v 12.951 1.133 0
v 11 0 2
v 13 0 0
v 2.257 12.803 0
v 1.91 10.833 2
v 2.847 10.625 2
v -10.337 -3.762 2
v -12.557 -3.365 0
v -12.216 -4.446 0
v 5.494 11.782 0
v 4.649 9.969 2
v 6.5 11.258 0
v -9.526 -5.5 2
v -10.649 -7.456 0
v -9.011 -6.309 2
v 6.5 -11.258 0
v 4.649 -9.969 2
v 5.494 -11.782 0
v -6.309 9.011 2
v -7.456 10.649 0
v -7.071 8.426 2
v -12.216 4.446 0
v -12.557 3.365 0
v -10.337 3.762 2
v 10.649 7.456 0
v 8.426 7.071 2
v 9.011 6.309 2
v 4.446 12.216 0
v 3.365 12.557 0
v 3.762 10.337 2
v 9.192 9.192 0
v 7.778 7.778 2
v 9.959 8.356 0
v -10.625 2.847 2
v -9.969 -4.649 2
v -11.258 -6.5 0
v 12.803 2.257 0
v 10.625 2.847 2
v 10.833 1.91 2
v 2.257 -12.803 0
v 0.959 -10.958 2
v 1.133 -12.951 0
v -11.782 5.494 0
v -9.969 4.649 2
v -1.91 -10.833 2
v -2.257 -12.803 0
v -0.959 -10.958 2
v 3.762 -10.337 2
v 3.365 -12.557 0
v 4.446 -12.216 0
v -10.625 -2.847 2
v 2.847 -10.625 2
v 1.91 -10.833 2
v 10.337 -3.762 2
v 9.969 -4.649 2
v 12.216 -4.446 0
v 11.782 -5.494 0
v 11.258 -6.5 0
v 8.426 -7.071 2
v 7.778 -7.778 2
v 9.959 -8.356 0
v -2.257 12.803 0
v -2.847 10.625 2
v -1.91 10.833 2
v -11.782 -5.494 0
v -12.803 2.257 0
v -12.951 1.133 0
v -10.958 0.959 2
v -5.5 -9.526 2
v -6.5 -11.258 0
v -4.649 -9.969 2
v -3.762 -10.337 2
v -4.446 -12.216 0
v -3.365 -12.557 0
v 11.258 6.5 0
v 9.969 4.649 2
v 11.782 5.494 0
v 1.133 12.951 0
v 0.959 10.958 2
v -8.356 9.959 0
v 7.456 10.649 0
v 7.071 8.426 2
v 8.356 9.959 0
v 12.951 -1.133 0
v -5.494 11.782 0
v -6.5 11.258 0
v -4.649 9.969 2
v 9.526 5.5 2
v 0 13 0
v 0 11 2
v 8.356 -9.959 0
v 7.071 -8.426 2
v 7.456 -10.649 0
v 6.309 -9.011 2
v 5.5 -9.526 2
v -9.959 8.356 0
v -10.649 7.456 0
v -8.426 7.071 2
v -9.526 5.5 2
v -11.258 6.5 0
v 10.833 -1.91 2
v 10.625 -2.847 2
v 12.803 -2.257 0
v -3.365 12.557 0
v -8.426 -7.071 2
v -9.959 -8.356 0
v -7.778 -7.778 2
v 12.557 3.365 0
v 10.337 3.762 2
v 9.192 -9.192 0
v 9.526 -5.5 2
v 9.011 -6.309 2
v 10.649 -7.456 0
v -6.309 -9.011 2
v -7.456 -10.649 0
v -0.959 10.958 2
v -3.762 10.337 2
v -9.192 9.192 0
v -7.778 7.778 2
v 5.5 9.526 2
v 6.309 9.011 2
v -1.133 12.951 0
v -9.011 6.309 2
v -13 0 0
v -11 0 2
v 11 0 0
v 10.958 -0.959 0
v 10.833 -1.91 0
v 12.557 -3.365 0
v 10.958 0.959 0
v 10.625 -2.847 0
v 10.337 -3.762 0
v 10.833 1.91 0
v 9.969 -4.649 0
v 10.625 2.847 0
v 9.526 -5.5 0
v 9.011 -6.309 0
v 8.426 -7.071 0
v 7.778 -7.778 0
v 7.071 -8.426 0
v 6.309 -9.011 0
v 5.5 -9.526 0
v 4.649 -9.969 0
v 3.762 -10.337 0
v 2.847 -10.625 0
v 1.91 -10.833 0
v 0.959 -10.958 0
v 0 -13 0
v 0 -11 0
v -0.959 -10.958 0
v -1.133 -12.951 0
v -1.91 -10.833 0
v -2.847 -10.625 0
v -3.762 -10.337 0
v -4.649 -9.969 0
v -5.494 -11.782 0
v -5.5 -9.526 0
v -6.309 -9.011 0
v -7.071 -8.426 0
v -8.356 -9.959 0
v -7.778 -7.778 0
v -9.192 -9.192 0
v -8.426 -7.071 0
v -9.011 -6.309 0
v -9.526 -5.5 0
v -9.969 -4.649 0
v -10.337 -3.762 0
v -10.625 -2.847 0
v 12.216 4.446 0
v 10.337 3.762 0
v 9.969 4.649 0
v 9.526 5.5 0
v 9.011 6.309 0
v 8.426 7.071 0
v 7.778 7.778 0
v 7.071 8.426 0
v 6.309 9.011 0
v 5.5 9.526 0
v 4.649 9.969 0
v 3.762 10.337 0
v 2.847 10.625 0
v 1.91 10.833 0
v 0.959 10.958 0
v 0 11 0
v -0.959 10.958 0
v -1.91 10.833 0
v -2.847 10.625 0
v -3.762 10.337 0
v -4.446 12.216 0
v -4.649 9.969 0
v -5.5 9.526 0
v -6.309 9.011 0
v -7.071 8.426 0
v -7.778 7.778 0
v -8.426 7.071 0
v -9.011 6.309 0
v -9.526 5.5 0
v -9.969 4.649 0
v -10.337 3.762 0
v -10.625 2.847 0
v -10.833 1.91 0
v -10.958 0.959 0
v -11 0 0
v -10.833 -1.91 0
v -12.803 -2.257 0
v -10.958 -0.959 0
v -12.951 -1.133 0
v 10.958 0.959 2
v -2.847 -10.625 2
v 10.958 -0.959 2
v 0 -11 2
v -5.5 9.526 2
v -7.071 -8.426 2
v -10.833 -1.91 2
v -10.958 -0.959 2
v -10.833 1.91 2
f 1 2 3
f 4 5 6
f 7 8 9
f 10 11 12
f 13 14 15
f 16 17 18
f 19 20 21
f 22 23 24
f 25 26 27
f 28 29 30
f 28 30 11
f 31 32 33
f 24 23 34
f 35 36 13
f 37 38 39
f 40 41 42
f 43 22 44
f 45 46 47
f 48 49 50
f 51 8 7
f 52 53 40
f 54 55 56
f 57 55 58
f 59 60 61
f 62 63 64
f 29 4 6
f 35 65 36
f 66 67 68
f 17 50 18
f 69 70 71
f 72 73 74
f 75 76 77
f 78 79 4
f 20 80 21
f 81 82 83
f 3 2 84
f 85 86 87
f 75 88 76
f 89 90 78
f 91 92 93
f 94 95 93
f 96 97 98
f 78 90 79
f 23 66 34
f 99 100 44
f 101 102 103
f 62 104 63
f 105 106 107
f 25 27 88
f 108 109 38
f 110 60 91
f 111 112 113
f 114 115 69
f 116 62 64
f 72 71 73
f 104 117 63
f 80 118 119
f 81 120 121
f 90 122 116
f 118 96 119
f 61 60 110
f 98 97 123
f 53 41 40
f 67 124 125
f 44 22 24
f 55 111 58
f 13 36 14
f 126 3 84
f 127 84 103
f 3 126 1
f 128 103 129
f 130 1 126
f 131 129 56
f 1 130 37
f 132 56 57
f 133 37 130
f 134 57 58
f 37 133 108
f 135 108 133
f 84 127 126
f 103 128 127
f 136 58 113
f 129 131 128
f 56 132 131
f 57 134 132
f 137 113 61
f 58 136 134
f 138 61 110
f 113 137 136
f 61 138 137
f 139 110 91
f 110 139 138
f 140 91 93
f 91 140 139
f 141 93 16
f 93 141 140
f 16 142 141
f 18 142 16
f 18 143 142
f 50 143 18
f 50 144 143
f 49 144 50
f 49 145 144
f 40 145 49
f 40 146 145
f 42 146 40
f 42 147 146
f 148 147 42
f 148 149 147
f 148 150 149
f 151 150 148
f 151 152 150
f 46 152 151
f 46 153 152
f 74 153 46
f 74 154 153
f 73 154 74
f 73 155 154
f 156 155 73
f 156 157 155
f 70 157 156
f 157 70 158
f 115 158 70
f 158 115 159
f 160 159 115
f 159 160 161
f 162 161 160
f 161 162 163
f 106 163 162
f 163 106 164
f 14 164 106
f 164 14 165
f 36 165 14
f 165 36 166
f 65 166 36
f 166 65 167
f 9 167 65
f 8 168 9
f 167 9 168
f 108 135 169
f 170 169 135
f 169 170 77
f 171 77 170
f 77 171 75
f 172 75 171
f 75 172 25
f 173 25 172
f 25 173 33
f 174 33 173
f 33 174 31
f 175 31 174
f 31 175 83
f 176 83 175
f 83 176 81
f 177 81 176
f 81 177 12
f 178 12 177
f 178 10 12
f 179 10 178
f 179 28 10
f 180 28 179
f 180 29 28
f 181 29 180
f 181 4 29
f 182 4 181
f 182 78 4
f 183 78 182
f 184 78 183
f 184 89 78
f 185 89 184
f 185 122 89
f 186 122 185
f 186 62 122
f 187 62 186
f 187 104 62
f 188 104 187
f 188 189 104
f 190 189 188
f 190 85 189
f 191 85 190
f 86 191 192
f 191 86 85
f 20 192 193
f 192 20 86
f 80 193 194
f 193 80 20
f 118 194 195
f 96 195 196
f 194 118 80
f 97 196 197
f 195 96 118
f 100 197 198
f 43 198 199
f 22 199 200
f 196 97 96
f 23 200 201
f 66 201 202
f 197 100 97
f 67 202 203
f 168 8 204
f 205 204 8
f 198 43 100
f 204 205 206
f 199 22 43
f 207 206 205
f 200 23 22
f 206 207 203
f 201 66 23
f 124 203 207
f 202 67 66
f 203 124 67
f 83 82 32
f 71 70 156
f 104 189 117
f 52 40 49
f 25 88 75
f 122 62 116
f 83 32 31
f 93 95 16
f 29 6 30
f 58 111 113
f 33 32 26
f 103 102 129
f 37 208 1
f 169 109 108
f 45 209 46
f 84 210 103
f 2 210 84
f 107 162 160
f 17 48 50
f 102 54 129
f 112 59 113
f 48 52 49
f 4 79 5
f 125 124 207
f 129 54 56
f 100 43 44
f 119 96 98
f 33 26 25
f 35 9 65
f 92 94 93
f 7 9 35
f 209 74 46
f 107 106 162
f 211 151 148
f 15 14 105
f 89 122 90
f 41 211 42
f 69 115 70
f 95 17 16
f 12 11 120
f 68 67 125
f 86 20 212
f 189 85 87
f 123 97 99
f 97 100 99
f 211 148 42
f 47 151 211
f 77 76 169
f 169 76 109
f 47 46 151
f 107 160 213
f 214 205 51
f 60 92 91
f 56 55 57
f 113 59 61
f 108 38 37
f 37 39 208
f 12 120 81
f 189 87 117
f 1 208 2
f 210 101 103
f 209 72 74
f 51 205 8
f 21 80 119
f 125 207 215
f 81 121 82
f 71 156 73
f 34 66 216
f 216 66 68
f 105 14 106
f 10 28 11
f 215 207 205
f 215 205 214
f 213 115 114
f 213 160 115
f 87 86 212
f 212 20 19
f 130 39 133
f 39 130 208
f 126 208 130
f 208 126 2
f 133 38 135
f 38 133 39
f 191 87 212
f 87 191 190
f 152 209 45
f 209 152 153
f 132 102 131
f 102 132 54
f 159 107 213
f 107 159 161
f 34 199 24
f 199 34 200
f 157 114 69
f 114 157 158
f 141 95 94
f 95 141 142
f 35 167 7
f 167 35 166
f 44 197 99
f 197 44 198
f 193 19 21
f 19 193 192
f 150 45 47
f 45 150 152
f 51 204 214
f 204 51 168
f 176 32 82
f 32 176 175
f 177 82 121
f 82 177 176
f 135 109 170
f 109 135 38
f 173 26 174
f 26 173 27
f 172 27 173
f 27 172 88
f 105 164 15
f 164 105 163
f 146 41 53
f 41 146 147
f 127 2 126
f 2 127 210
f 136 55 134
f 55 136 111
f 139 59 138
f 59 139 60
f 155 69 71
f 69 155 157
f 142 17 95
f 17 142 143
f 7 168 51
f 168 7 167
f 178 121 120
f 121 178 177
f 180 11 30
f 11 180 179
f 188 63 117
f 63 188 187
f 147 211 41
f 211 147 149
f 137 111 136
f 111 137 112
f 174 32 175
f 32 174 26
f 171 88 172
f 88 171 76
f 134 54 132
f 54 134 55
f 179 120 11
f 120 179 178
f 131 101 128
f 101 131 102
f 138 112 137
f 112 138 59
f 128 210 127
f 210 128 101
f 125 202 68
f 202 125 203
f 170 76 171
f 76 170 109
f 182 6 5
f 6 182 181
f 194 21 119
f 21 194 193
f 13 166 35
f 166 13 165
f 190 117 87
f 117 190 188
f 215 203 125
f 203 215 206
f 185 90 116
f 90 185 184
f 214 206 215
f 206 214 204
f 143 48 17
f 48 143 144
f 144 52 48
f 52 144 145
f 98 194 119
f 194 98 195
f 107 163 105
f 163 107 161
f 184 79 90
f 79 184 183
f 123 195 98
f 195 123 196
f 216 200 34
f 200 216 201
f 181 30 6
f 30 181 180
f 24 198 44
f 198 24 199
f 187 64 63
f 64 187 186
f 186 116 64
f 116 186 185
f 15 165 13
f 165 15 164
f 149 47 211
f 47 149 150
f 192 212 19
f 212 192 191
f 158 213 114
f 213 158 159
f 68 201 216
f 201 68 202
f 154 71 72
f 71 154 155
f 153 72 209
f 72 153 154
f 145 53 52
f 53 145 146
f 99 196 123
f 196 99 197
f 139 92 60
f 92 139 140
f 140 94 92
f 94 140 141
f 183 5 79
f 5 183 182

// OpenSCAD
$fn = 72;

module normal() {
    difference() {
        cylinder(2, 13, 11);    
        cylinder(2, 11, 11);
    }
}

module home() {
    difference(){
        union()
        {
            translate([0, 0, 1]) cube([2, 35, 2], true);
            translate([0, 0, 1]) cube([35, 2, 2], true);
            cylinder(2, 13, 11);
        }
        cylinder(2, 11, 11);
    }
}

module dead() {
    difference(){
        cylinder(3, 13, 11);
        cylinder(3, 11, 11);
    }
    translate([0, 0, 0.5]) cube([2, 22, 1], true);
    translate([0, 0, 0.5]) cube([22, 2, 1], true);
}

normal();
